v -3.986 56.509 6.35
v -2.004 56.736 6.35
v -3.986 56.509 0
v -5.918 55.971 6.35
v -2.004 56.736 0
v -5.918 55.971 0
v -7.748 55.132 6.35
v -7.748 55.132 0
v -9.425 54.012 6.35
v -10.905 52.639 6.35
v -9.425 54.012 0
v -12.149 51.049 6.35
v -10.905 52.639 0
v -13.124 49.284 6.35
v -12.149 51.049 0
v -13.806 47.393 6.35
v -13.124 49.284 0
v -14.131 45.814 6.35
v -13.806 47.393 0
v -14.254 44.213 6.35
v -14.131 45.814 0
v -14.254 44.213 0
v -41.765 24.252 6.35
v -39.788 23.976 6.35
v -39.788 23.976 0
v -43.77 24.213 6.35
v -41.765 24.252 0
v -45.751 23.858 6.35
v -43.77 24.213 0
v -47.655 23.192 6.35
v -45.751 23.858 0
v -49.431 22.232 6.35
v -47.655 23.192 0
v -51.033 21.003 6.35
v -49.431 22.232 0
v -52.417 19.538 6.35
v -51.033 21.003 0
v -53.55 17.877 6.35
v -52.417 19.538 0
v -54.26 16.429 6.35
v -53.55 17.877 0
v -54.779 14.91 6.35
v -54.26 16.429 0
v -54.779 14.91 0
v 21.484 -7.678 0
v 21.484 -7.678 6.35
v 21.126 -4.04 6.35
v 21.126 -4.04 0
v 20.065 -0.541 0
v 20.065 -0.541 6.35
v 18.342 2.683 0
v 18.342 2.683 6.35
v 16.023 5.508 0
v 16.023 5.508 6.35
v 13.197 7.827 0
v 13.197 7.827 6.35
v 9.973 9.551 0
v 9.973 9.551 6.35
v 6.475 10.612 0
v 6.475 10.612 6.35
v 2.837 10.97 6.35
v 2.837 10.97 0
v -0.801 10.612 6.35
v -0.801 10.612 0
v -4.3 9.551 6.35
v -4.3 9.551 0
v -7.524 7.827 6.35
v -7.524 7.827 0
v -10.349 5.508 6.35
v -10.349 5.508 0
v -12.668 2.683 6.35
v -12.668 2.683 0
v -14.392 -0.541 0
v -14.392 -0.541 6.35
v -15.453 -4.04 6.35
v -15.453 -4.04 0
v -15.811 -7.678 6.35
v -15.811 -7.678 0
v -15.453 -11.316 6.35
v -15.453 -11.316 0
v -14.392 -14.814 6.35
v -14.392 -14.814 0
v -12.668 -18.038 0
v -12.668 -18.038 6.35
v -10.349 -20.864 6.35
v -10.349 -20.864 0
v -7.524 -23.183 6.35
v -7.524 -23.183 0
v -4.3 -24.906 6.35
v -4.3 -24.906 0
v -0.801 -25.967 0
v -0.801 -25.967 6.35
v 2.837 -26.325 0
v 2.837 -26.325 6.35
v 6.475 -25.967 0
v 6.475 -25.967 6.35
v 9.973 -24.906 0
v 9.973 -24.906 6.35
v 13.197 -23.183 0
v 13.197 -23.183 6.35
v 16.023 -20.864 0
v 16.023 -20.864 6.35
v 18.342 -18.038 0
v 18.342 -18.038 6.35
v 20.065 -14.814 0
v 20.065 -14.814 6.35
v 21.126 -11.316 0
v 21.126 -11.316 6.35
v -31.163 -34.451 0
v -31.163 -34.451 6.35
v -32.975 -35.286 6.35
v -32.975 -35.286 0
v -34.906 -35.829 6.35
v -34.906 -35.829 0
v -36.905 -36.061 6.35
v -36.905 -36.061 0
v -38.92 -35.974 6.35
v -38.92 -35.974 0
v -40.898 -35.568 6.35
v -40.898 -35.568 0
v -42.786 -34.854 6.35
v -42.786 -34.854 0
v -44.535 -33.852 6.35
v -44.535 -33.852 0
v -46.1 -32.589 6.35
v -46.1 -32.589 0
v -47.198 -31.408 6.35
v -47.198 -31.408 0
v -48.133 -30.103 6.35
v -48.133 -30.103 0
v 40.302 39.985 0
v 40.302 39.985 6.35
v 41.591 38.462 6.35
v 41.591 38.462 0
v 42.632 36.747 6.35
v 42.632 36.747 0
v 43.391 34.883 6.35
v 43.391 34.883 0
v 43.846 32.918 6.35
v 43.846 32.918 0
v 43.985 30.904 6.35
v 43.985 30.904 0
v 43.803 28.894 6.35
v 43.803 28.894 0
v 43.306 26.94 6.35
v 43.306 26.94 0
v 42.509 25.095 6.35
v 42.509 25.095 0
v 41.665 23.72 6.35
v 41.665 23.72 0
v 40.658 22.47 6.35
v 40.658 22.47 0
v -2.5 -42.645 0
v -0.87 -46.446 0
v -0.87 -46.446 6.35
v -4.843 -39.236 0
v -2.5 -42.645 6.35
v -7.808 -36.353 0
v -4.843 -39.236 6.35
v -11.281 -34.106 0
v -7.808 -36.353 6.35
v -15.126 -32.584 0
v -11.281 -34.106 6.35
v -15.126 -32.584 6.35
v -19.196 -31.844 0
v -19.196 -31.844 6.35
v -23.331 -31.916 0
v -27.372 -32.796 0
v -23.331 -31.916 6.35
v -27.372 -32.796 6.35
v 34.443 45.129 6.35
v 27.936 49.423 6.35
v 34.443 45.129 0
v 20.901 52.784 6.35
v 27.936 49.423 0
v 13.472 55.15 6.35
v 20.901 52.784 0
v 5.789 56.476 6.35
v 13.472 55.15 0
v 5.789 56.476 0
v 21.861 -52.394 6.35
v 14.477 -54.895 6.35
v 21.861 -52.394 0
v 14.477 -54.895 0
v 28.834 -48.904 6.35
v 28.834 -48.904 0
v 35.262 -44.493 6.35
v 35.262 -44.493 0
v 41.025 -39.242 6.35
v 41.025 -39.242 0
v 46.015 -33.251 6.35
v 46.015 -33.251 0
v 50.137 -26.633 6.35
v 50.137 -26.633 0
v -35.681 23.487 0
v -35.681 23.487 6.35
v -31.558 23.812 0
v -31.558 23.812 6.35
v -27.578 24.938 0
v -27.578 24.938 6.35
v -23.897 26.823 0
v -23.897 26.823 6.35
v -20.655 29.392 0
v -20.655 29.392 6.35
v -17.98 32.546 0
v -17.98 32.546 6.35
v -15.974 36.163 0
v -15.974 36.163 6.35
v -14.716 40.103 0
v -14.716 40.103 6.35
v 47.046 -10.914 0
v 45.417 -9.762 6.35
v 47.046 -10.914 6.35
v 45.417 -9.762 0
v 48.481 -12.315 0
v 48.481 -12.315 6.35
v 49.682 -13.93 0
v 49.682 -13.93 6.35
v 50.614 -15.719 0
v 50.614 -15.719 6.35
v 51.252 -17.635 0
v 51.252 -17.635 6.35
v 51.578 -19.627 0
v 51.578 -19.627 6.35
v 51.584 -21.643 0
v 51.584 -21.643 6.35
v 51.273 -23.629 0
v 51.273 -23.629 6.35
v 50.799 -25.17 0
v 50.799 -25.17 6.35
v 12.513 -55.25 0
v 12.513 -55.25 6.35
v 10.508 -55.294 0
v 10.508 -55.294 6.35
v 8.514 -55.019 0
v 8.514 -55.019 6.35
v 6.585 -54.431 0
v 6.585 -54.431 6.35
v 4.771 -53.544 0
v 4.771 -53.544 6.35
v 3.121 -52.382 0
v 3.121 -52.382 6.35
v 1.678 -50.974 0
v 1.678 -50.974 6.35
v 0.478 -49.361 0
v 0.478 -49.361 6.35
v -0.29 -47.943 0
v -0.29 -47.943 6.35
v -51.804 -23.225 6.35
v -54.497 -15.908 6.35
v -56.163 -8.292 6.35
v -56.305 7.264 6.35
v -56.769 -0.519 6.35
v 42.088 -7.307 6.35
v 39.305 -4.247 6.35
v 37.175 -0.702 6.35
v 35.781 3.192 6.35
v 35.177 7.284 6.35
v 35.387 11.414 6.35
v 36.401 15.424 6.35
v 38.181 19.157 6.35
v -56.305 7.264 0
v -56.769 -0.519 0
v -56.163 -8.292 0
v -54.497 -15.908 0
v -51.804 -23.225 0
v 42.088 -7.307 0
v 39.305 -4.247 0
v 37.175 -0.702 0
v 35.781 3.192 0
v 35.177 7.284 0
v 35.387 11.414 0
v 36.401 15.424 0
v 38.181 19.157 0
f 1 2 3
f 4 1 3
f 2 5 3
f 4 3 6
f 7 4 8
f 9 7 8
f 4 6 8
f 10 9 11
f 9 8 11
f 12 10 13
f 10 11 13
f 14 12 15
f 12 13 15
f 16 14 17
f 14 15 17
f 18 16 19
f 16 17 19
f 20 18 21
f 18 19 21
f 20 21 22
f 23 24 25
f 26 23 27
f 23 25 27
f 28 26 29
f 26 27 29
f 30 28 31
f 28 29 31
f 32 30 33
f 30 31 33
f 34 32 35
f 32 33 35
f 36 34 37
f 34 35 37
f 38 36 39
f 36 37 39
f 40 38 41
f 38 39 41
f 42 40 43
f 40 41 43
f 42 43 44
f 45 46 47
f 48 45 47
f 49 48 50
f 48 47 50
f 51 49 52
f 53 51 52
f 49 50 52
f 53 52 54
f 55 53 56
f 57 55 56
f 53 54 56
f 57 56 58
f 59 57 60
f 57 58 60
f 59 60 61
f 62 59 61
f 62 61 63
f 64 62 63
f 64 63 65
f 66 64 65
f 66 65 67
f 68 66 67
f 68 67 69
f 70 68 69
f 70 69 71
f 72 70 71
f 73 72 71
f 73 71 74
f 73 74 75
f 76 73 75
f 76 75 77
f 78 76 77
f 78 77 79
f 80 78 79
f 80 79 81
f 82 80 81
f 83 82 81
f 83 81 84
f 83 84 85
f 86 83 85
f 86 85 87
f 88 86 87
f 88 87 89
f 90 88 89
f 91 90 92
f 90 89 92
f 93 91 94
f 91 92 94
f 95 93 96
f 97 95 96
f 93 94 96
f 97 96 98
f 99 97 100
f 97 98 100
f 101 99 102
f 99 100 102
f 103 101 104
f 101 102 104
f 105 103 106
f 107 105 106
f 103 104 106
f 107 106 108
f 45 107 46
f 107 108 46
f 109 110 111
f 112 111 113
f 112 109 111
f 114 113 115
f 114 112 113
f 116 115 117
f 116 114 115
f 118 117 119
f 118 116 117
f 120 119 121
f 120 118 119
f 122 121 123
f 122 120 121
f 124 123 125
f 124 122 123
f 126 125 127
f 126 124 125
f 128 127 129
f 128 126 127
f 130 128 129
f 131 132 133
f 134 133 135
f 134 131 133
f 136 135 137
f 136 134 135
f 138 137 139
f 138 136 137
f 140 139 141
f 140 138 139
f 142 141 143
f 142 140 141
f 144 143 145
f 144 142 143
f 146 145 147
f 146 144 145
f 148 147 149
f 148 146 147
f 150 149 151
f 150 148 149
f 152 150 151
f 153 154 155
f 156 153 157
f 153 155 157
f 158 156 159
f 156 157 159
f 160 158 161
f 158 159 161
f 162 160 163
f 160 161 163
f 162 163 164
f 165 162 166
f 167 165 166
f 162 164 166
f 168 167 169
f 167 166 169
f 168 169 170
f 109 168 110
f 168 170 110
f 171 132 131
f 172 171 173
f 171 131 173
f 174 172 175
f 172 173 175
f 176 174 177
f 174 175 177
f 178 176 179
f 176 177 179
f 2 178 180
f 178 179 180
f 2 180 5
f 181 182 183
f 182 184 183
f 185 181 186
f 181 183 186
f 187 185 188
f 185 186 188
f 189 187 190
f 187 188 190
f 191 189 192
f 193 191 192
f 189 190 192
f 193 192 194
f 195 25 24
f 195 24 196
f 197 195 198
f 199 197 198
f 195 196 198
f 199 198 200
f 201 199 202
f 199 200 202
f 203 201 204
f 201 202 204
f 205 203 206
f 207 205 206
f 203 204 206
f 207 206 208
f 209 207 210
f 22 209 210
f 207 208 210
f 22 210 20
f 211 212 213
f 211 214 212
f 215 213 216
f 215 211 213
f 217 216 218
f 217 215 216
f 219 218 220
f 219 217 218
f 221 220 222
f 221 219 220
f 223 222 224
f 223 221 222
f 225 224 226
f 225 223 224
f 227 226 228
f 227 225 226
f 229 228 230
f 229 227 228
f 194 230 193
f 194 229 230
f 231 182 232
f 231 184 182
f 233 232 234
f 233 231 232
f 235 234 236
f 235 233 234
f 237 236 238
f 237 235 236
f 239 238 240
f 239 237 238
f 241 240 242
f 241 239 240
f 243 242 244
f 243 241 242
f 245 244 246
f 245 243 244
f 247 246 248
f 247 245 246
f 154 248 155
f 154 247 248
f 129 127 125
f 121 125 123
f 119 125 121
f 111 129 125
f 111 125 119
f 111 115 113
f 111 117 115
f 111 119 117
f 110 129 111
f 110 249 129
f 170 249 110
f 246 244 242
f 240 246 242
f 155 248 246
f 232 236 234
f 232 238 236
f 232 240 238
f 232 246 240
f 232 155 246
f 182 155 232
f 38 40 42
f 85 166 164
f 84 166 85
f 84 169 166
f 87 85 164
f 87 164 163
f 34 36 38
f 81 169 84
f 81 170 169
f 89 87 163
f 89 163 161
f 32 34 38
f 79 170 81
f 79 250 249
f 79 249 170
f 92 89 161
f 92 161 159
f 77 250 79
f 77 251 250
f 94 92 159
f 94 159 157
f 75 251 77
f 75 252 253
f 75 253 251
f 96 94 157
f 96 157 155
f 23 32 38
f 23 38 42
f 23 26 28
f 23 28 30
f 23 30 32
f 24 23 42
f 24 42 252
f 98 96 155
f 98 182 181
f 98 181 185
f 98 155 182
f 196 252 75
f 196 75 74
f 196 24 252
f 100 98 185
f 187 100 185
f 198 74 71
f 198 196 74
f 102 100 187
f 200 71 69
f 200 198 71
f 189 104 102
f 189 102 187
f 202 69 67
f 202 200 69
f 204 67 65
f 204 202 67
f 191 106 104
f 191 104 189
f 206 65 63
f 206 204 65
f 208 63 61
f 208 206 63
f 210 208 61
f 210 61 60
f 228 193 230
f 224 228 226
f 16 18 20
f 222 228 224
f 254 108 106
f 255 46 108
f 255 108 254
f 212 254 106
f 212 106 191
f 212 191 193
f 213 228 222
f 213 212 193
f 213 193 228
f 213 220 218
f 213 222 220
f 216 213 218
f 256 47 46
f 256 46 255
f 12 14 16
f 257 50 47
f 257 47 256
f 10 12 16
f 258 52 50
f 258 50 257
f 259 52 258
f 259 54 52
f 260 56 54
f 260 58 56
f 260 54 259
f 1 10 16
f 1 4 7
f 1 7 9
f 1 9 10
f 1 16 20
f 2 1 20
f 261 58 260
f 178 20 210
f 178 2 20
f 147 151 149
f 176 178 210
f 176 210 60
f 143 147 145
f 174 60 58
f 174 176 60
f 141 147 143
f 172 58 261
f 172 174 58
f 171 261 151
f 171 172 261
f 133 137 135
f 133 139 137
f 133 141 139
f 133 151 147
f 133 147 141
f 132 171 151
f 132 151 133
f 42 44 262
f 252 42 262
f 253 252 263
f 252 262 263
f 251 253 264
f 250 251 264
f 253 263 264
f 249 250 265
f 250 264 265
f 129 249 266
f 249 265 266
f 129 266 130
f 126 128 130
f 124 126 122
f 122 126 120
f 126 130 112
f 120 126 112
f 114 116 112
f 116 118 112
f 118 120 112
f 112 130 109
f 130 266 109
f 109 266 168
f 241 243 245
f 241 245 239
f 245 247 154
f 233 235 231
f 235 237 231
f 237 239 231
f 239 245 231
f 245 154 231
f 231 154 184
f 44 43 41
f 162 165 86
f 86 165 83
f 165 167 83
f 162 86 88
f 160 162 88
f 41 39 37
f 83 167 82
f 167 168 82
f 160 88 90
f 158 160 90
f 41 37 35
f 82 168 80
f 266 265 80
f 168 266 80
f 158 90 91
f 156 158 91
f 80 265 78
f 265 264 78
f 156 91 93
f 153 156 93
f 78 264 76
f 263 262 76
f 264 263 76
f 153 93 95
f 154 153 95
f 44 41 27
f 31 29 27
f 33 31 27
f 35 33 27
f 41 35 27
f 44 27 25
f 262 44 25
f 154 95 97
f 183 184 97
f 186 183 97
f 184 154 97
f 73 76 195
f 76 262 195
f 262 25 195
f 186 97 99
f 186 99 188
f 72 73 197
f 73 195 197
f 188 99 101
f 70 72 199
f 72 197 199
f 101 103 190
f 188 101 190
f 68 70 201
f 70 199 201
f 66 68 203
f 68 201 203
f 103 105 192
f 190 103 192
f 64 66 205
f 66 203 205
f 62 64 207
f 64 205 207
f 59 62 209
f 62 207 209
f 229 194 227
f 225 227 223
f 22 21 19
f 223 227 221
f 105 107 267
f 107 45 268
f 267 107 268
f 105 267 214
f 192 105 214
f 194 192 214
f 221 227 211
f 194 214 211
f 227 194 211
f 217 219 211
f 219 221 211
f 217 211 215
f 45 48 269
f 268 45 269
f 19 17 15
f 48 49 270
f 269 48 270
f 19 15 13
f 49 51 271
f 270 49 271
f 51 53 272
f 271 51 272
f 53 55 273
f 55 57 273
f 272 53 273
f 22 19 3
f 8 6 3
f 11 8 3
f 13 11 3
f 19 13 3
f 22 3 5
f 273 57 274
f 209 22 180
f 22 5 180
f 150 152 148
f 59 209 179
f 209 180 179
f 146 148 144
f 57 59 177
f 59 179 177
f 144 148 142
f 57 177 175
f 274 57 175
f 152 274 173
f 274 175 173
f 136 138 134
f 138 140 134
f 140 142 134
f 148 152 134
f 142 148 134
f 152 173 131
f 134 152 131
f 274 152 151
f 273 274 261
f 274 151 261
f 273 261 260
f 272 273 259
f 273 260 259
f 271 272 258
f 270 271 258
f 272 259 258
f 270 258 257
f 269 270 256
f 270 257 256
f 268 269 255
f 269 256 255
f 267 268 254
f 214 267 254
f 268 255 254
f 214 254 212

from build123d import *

# Parameters (mm, degrees)
F0_R     = 56.7715385185
F1_DEPTH = 6.35
F2_R     = 18.6477696788
F3_DEPTH = 25.4
F5_DEPTH = 25.4
F6_R     = 12.7


with BuildPart() as f1:
    # F0 (on Top) → F1 (new body)
    with BuildSketch(Plane.XY):
        Circle(F0_R)
    extrude(amount=F1_DEPTH)

    # F2 (on face) → F3 (cut)
    with BuildSketch(Plane.XY.offset(6.35)):
        with Locations((2.8365715407, -7.6775541529)):
            Circle(F2_R)
    extrude(amount=-F3_DEPTH, mode=Mode.SUBTRACT)

    # F4 (on face) → F5 (cut)
    with BuildSketch(Plane.XY.offset(6.35)):
        with BuildLine():
            ThreePointArc((-16.6661772977, 54.2701217987), (-35.2620612858, 44.4926355663), (-49.0286391406, 28.6216723792))
            ThreePointArc((-49.0286391406, 28.6216723792), (-22.2124908393, 28.0270699981), (-16.6661772977, 54.2701217987))
        make_face()
        with BuildLine():
            ThreePointArc((56.7715385185, 0), (54.8722368944, 14.5617720065), (49.3014149495, 28.1492108191))
            ThreePointArc((49.3014149495, 28.1492108191), (35.3784000316, 5.2230463491), (55.332392793, -12.7017279755))
            ThreePointArc((55.332392793, -12.7017279755), (56.4106047412, -6.391498924), (56.7715385185, 0))
        make_face()
        with BuildLine():
            ThreePointArc((-0.2727758089, -56.7708831983), (-13.1659091923, -33.2501163472), (-38.6662154953, -41.5683938231))
            ThreePointArc((-38.6662154953, -41.5683938231), (-20.9007220389, -52.7841586465), (-0.2727758089, -56.7708831983))
        make_face()
    extrude(amount=-F5_DEPTH, mode=Mode.SUBTRACT)

    # F6
    f6_edges = [f1.edges().sort_by_distance(p)[0] for p in [
        (-0.272776, -56.770883, 3.175),
        (-38.666215, -41.568394, 3.175),
        (49.301415, 28.149211, 3.175),
        (55.332393, -12.701728, 3.175),
        (-16.666177, 54.270122, 3.175),
        (-49.028639, 28.621672, 3.175),
    ]]
    fillet(f6_edges, radius=F6_R)


solid = f1.part
